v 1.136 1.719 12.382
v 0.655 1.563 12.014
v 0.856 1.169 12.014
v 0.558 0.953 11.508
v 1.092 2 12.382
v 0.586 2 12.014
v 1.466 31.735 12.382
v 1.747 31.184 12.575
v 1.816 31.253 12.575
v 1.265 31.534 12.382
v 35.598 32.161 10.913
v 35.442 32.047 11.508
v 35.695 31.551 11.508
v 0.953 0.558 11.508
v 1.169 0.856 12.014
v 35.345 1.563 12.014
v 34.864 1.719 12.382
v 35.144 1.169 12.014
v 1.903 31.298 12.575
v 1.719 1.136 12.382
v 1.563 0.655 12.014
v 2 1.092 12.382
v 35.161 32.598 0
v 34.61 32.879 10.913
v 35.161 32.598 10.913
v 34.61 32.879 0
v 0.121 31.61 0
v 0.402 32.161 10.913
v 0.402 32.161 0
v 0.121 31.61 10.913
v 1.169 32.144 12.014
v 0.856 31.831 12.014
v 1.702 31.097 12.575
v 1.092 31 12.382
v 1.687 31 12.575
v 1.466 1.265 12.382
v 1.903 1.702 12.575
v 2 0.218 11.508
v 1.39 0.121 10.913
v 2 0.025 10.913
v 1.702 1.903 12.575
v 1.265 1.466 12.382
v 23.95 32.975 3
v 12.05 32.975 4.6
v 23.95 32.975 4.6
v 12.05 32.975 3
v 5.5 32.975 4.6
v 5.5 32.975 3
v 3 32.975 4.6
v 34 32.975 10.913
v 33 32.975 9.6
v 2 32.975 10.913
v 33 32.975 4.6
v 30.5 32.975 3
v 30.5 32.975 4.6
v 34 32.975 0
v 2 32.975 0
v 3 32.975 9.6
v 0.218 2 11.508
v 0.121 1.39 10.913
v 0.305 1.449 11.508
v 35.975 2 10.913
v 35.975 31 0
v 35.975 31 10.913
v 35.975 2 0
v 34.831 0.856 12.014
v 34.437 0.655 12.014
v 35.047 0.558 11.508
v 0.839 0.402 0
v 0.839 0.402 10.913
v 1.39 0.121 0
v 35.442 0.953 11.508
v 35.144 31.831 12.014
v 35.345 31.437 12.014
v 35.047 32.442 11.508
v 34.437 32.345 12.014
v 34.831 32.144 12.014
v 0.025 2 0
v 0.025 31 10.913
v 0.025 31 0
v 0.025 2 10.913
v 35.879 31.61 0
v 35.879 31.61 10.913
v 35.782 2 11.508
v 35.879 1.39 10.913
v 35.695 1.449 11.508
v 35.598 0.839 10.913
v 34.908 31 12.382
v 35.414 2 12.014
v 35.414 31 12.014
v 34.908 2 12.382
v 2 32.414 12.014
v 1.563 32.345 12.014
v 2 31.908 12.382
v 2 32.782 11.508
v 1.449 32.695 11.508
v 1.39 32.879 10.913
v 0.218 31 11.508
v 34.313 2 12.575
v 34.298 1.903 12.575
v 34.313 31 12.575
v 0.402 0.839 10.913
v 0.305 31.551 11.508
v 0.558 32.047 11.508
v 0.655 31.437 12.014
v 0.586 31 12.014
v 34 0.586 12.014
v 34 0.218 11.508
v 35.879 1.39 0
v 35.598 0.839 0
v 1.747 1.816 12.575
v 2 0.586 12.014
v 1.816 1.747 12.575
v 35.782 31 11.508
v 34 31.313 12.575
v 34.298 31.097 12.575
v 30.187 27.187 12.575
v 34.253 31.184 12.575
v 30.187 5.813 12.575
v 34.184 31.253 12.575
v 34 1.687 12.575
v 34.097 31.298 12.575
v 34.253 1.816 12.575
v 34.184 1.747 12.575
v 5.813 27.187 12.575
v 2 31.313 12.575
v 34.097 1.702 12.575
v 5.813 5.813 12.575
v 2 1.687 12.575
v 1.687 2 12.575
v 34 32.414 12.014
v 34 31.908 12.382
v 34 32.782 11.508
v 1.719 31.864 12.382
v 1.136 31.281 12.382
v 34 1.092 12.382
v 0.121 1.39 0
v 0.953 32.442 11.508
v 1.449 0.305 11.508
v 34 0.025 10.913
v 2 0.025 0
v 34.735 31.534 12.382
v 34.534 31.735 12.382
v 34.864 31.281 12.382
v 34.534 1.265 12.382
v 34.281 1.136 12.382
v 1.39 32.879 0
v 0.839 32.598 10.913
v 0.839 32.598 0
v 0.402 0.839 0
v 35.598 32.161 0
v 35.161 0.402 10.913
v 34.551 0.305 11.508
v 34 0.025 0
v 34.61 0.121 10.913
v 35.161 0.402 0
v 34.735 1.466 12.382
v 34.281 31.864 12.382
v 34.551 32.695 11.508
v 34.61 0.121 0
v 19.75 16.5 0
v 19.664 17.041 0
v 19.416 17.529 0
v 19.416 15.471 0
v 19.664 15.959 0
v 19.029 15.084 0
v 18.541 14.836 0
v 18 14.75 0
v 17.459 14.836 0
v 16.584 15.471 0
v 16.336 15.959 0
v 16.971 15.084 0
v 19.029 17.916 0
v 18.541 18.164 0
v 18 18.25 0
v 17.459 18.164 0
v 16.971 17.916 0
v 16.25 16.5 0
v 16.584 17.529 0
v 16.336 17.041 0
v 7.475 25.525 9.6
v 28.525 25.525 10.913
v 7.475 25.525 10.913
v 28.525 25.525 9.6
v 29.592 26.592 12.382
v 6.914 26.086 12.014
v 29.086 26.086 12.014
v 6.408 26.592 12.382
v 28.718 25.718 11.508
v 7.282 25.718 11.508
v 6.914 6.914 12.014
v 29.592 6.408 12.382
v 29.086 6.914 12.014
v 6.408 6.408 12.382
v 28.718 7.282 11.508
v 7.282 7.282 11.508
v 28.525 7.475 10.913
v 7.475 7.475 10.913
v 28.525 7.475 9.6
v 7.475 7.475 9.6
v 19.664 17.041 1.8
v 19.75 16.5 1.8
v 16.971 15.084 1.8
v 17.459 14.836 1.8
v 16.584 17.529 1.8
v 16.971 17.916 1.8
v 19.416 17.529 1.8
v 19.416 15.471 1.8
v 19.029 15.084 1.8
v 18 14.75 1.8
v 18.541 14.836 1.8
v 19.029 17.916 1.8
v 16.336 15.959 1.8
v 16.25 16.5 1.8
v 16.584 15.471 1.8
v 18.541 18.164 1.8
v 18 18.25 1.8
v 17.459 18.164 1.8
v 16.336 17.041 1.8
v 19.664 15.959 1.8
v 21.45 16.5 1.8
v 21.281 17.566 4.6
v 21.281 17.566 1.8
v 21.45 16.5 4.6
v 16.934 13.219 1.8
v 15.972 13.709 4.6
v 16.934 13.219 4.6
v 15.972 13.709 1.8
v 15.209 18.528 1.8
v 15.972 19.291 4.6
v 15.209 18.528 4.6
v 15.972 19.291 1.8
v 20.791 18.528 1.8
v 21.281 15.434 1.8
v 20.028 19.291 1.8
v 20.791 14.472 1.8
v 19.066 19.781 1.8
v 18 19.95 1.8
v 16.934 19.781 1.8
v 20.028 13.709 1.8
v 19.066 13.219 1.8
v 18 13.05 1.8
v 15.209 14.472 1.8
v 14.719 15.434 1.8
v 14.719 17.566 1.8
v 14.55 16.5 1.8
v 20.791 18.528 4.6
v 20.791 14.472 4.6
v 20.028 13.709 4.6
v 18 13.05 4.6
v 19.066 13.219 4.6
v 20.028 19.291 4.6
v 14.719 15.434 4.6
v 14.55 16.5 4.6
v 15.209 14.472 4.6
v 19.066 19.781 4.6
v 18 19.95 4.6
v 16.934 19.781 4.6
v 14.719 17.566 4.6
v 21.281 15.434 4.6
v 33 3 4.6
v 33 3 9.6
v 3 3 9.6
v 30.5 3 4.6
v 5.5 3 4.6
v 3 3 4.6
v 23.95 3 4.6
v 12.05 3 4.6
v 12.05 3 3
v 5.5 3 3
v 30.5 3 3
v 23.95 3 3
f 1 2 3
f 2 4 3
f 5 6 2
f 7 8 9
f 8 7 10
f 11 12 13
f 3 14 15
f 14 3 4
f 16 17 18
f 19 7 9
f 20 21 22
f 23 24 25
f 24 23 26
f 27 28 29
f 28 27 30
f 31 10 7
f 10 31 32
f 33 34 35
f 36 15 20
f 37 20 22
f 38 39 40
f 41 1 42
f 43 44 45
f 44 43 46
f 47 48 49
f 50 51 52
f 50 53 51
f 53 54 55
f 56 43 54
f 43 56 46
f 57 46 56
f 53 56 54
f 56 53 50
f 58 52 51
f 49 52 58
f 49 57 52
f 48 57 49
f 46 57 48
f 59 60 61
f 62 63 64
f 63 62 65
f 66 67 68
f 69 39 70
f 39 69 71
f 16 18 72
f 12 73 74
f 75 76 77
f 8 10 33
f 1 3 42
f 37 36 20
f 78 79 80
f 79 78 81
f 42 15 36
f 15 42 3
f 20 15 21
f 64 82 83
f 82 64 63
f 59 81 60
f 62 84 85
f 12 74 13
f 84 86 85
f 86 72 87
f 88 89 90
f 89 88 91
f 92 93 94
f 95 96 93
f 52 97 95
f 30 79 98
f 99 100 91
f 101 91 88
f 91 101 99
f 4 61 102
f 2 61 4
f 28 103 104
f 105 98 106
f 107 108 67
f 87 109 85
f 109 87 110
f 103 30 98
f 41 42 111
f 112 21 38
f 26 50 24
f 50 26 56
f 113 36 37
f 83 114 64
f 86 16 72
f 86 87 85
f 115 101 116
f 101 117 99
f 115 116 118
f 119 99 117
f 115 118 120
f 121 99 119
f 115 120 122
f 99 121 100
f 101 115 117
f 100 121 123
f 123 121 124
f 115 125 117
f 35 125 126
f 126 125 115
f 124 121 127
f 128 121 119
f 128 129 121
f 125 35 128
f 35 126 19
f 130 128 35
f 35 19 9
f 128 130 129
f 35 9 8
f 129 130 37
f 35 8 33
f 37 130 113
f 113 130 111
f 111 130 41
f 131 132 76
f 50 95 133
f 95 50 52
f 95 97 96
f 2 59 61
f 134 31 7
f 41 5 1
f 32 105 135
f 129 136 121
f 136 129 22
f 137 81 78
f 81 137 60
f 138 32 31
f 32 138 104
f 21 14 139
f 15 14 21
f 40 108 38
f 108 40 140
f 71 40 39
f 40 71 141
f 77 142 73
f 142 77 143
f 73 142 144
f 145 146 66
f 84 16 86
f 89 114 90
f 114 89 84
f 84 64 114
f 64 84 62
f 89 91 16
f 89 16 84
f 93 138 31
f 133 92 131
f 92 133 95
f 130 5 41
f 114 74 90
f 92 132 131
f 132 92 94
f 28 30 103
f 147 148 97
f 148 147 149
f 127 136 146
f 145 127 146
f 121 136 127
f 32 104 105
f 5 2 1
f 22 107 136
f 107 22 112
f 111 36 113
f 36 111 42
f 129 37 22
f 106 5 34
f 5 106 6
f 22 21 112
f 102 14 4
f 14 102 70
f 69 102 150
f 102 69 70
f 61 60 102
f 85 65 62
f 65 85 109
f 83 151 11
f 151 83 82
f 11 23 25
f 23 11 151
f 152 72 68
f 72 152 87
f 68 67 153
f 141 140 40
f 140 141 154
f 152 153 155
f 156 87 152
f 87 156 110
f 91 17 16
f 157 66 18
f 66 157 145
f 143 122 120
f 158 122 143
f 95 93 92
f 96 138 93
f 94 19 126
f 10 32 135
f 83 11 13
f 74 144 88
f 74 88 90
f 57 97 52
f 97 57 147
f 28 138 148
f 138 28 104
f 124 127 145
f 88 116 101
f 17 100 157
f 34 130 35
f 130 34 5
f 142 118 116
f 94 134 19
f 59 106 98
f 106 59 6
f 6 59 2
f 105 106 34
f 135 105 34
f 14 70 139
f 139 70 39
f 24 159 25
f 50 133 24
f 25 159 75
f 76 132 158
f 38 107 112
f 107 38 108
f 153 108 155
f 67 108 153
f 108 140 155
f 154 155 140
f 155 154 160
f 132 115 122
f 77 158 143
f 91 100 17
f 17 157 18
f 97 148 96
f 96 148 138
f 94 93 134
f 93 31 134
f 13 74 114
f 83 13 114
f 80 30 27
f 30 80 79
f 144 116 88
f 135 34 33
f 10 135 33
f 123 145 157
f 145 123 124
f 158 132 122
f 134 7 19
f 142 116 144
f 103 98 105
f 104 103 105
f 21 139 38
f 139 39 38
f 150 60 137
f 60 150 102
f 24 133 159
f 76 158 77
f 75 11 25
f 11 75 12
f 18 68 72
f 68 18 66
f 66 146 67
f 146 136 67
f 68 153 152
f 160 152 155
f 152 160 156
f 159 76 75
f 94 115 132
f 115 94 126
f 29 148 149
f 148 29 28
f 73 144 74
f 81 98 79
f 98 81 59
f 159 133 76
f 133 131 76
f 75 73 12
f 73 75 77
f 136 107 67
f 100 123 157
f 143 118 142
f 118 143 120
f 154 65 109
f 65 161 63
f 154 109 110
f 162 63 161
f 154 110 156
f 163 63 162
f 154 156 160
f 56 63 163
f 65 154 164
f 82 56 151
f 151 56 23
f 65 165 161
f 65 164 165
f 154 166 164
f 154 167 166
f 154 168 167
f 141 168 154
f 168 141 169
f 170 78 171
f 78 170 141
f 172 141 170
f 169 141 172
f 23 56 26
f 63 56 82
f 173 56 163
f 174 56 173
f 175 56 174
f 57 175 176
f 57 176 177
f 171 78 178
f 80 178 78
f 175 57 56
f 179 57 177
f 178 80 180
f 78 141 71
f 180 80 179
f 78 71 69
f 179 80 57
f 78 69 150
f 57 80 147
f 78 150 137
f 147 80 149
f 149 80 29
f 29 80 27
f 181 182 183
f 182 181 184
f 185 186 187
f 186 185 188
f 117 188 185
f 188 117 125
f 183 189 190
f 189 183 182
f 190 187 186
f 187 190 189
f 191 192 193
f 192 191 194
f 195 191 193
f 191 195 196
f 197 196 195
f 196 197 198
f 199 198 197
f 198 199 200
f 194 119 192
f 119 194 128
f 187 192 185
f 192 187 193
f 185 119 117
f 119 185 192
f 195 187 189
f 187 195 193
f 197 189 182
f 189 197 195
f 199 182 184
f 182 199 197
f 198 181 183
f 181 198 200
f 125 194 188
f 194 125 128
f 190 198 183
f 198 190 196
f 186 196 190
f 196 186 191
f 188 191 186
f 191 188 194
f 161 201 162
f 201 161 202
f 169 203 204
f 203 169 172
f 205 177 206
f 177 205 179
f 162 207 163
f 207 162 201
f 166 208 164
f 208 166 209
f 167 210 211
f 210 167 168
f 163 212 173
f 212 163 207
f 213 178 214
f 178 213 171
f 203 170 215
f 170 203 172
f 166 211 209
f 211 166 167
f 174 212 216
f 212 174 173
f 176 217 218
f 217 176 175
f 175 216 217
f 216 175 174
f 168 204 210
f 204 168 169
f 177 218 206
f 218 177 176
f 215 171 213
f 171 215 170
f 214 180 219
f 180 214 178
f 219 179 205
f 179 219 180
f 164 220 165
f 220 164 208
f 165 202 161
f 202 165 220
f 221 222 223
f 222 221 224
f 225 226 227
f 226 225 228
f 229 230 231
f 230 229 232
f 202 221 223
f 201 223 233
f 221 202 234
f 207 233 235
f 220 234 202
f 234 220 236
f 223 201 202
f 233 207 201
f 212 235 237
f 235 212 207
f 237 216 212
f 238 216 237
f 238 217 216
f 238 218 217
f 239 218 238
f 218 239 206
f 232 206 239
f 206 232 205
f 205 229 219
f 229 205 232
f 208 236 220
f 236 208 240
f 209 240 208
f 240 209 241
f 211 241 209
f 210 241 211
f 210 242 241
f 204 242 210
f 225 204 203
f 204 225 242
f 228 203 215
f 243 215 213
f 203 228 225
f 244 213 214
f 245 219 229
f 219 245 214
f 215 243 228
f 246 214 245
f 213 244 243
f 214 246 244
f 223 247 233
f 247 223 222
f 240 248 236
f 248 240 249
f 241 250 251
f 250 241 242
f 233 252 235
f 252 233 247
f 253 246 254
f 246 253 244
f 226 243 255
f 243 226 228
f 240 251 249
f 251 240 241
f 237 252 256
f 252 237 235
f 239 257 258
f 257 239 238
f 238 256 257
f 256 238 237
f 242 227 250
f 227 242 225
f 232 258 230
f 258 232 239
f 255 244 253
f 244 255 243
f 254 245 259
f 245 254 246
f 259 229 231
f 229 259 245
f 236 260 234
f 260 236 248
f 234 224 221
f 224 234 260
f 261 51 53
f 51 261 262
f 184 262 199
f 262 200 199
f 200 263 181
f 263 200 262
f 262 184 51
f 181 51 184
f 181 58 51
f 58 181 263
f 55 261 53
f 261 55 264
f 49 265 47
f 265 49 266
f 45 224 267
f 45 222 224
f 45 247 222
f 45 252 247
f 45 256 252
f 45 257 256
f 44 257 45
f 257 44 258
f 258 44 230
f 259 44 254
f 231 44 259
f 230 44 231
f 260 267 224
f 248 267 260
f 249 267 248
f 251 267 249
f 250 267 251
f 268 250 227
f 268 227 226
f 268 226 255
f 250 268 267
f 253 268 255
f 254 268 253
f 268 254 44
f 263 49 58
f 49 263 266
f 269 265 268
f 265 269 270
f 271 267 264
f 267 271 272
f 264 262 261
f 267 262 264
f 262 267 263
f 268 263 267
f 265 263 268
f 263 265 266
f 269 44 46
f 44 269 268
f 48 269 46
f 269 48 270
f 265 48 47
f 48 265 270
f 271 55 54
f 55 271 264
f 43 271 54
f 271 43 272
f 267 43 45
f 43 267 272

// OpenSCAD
// file: ../utilities/roundedWindow.scad
use <../primitives/roundedCube.scad>;

// Example:
difference() {
  cube([ 60, 50, 20 ]);
  roundedWindow(
    x = 60,
    y = 50,
    z = 20,
    r = 5,
    padding = 10,
    $fn = 30
  );
}

module roundedWindow(
  x,
  y,
  z,
  r,
  padding = 0
) {
  _x = x - padding * 2;
  _y = y - padding * 2;

  if (_x - r * 2 <= 0) {
    echo("<b style='color: red'>WARNING</b>: roundedWindow() is too small along its x-axis");
  }
  if (_y - r * 2 <= 0) {
    echo("<b style='color: red'>WARNING</b>: roundedWindow() is too small along its y-axis");
  }

  translate([ _x / -2 + padding, _y / -2 + padding, 0 ])
  difference() {
    translate([ _x / 2 - r, _y / 2 - r, 0 ])
    cube([ _x + 2 * r, _y + 2 * r, z ]);
    minkowski() {
      difference() {
        cube([ _x * 2, _y * 2, z - r ]);
        translate([ _x / 2 - r, _y / 2 - r, 0 ])
        cube([ _x + r * 2, _y + r * 2, z + r ]);
      }
      sphere(r = r);
    }
  }
}
// file: ../utilities/screwHole.scad
include <../config.scad>;

// Example:
screwHole();

module screwHole() {
  // Main:
  translate([ 0, 0, -SOLID_MERGE_MARGIN ])
  cylinder(SCREW_FREE_SPACE, r = SCREW_MAIN_DIAMETER / 2, $fn = SCREW_ARC_FN);
  // Head embed:
  translate([ 0, 0, WALL_ATTACHMENT_THICKNESS - SCREW_HEAD_EMBED ])
  cylinder(SCREW_FREE_SPACE, r = SCREW_HEAD_DIAMETER / 2, $fn = SCREW_ARC_FN);
  // Head access:
  translate([ 0, 0, WALL_ATTACHMENT_THICKNESS ])
  cylinder(SCREW_FREE_SPACE, r = SCREW_ACCESS_DIAMETER / 2, $fn = SCREW_ARC_FN);
}
// file: ../primitives/roundedCube.scad
// Example:
roundedCube(
  x = 30,
  y = 20,
  z = 10,
  r = 3,
  flatBottom = true
);

module roundedCube(
  x,
  y,
  z,
  r = 0,
  flatTop = false,
  flatBottom = false,
  flatLeft = false,
  flatRight = false,
  flatFront = false,
  flatBack = false
) {
  difference() {
    // Main rounded cube:
    translate([
      flatLeft ? 0 : r,
      flatFront ? 0 : r,
      flatBottom ? 0 : r
    ]) {
      minkowski() {
        cube([
          x - r * (flatLeft && flatRight ? 0 : (flatLeft || flatRight ? 1 : 2)),
          y - r * (flatFront && flatBack ? 0 : (flatFront || flatBack ? 1 : 2)),
          z - r * (flatTop && flatBottom ? 0 : (flatTop || flatBottom ? 1 : 2))
        ]);
        sphere(r = r);
      }
    }
    // Optional cutouts:
    // (let's not generate unnecessary geometry)
    if (flatTop) {
      translate([ x / -2, y / -2, z ])
      cube([ x * 2, y * 2, z ]);
    }
    if (flatBottom) {
      translate([ x / -2, y / -2, -z ])
      cube([ x * 2, y * 2, z ]);
    }
    if (flatLeft) {
      translate([ -x, y / -2, z / -2 ])
      cube([ x, y * 2, z * 2 ]);
    }
    if (flatRight) {
      translate([ x, y / -2, z / -2 ])
      cube([ x, y * 2, z * 2 ]);
    }
    if (flatFront) {
      translate([ x / -2, -y, z / -2 ])
      cube([ x * 2, y, z * 2 ]);
    }
    if (flatBack) {
      translate([ x / -2, y, z / -2 ])
      cube([ x * 2, y, z * 2 ]);
    }
  }
}
// file: ../config.scad
SCREW_MAIN_DIAMETER = 3.5;
SCREW_MAIN_EMBED = 1.8;
SCREW_HEAD_DIAMETER = 6.9;
SCREW_HEAD_EMBED = 2.8;
SCREW_ACCESS_DIAMETER = 10;
SCREW_FREE_SPACE = 100;
SCREW_ARC_FN = 20; // see https://en.wikibooks.org/wiki/OpenSCAD_User_Manual/Other_Language_Features#.24fa.2C_.24fs_and_.24fn

WALL_ATTACHMENT_THICKNESS = SCREW_MAIN_EMBED + SCREW_HEAD_EMBED;
WALL_THICKNESS = 3;

SOLID_MERGE_MARGIN = 1;
GLOBAL_ROUNDING = 2;
// main file
include <../config.scad>;

use <../primitives/roundedCube.scad>;
use <../utilities/screwHole.scad>;
use <../utilities/roundedWindow.scad>;

// Example:
basket(
  width = 30,
  height = 30,
  depth = 5,
  $fn = 20
);

module basket(
  width,
  height,
  depth,
  windowPadding = 7.5,
  groovePadding = 2.5
) {

  outerWidth = width + WALL_THICKNESS * 2;
  outerHeight = height + WALL_THICKNESS * 1;
  outerDepth = depth + WALL_ATTACHMENT_THICKNESS + WALL_THICKNESS;

  difference() {

    // Main body:
    roundedCube(outerWidth, outerHeight, outerDepth, r = GLOBAL_ROUNDING, flatBottom = true);

    // Remove space for contained object:
    translate([ WALL_THICKNESS, WALL_THICKNESS, WALL_ATTACHMENT_THICKNESS ])
    cube([ width, height, depth ]);

    // Open a window:
    translate([ 0, 0, WALL_ATTACHMENT_THICKNESS ])
    roundedWindow(outerWidth, outerHeight, depth + WALL_THICKNESS, r = GLOBAL_ROUNDING, padding = windowPadding);

    // Add screw hole:
    translate([ outerWidth / 2, outerHeight / 2, 0 ])
    screwHole();

    // Add "grooves" to bottom to remove unnecessary material:
    grooveWidth = width / 2 - groovePadding * 2 - SCREW_HEAD_DIAMETER / 2;
    translate([ WALL_THICKNESS + groovePadding, WALL_THICKNESS, WALL_THICKNESS ])
    cube([ grooveWidth, height, WALL_ATTACHMENT_THICKNESS - WALL_THICKNESS ]);
    translate([ WALL_THICKNESS + width - groovePadding - grooveWidth, WALL_THICKNESS, WALL_THICKNESS ])
    cube([ grooveWidth, height, WALL_ATTACHMENT_THICKNESS - WALL_THICKNESS ]);

  }

}
